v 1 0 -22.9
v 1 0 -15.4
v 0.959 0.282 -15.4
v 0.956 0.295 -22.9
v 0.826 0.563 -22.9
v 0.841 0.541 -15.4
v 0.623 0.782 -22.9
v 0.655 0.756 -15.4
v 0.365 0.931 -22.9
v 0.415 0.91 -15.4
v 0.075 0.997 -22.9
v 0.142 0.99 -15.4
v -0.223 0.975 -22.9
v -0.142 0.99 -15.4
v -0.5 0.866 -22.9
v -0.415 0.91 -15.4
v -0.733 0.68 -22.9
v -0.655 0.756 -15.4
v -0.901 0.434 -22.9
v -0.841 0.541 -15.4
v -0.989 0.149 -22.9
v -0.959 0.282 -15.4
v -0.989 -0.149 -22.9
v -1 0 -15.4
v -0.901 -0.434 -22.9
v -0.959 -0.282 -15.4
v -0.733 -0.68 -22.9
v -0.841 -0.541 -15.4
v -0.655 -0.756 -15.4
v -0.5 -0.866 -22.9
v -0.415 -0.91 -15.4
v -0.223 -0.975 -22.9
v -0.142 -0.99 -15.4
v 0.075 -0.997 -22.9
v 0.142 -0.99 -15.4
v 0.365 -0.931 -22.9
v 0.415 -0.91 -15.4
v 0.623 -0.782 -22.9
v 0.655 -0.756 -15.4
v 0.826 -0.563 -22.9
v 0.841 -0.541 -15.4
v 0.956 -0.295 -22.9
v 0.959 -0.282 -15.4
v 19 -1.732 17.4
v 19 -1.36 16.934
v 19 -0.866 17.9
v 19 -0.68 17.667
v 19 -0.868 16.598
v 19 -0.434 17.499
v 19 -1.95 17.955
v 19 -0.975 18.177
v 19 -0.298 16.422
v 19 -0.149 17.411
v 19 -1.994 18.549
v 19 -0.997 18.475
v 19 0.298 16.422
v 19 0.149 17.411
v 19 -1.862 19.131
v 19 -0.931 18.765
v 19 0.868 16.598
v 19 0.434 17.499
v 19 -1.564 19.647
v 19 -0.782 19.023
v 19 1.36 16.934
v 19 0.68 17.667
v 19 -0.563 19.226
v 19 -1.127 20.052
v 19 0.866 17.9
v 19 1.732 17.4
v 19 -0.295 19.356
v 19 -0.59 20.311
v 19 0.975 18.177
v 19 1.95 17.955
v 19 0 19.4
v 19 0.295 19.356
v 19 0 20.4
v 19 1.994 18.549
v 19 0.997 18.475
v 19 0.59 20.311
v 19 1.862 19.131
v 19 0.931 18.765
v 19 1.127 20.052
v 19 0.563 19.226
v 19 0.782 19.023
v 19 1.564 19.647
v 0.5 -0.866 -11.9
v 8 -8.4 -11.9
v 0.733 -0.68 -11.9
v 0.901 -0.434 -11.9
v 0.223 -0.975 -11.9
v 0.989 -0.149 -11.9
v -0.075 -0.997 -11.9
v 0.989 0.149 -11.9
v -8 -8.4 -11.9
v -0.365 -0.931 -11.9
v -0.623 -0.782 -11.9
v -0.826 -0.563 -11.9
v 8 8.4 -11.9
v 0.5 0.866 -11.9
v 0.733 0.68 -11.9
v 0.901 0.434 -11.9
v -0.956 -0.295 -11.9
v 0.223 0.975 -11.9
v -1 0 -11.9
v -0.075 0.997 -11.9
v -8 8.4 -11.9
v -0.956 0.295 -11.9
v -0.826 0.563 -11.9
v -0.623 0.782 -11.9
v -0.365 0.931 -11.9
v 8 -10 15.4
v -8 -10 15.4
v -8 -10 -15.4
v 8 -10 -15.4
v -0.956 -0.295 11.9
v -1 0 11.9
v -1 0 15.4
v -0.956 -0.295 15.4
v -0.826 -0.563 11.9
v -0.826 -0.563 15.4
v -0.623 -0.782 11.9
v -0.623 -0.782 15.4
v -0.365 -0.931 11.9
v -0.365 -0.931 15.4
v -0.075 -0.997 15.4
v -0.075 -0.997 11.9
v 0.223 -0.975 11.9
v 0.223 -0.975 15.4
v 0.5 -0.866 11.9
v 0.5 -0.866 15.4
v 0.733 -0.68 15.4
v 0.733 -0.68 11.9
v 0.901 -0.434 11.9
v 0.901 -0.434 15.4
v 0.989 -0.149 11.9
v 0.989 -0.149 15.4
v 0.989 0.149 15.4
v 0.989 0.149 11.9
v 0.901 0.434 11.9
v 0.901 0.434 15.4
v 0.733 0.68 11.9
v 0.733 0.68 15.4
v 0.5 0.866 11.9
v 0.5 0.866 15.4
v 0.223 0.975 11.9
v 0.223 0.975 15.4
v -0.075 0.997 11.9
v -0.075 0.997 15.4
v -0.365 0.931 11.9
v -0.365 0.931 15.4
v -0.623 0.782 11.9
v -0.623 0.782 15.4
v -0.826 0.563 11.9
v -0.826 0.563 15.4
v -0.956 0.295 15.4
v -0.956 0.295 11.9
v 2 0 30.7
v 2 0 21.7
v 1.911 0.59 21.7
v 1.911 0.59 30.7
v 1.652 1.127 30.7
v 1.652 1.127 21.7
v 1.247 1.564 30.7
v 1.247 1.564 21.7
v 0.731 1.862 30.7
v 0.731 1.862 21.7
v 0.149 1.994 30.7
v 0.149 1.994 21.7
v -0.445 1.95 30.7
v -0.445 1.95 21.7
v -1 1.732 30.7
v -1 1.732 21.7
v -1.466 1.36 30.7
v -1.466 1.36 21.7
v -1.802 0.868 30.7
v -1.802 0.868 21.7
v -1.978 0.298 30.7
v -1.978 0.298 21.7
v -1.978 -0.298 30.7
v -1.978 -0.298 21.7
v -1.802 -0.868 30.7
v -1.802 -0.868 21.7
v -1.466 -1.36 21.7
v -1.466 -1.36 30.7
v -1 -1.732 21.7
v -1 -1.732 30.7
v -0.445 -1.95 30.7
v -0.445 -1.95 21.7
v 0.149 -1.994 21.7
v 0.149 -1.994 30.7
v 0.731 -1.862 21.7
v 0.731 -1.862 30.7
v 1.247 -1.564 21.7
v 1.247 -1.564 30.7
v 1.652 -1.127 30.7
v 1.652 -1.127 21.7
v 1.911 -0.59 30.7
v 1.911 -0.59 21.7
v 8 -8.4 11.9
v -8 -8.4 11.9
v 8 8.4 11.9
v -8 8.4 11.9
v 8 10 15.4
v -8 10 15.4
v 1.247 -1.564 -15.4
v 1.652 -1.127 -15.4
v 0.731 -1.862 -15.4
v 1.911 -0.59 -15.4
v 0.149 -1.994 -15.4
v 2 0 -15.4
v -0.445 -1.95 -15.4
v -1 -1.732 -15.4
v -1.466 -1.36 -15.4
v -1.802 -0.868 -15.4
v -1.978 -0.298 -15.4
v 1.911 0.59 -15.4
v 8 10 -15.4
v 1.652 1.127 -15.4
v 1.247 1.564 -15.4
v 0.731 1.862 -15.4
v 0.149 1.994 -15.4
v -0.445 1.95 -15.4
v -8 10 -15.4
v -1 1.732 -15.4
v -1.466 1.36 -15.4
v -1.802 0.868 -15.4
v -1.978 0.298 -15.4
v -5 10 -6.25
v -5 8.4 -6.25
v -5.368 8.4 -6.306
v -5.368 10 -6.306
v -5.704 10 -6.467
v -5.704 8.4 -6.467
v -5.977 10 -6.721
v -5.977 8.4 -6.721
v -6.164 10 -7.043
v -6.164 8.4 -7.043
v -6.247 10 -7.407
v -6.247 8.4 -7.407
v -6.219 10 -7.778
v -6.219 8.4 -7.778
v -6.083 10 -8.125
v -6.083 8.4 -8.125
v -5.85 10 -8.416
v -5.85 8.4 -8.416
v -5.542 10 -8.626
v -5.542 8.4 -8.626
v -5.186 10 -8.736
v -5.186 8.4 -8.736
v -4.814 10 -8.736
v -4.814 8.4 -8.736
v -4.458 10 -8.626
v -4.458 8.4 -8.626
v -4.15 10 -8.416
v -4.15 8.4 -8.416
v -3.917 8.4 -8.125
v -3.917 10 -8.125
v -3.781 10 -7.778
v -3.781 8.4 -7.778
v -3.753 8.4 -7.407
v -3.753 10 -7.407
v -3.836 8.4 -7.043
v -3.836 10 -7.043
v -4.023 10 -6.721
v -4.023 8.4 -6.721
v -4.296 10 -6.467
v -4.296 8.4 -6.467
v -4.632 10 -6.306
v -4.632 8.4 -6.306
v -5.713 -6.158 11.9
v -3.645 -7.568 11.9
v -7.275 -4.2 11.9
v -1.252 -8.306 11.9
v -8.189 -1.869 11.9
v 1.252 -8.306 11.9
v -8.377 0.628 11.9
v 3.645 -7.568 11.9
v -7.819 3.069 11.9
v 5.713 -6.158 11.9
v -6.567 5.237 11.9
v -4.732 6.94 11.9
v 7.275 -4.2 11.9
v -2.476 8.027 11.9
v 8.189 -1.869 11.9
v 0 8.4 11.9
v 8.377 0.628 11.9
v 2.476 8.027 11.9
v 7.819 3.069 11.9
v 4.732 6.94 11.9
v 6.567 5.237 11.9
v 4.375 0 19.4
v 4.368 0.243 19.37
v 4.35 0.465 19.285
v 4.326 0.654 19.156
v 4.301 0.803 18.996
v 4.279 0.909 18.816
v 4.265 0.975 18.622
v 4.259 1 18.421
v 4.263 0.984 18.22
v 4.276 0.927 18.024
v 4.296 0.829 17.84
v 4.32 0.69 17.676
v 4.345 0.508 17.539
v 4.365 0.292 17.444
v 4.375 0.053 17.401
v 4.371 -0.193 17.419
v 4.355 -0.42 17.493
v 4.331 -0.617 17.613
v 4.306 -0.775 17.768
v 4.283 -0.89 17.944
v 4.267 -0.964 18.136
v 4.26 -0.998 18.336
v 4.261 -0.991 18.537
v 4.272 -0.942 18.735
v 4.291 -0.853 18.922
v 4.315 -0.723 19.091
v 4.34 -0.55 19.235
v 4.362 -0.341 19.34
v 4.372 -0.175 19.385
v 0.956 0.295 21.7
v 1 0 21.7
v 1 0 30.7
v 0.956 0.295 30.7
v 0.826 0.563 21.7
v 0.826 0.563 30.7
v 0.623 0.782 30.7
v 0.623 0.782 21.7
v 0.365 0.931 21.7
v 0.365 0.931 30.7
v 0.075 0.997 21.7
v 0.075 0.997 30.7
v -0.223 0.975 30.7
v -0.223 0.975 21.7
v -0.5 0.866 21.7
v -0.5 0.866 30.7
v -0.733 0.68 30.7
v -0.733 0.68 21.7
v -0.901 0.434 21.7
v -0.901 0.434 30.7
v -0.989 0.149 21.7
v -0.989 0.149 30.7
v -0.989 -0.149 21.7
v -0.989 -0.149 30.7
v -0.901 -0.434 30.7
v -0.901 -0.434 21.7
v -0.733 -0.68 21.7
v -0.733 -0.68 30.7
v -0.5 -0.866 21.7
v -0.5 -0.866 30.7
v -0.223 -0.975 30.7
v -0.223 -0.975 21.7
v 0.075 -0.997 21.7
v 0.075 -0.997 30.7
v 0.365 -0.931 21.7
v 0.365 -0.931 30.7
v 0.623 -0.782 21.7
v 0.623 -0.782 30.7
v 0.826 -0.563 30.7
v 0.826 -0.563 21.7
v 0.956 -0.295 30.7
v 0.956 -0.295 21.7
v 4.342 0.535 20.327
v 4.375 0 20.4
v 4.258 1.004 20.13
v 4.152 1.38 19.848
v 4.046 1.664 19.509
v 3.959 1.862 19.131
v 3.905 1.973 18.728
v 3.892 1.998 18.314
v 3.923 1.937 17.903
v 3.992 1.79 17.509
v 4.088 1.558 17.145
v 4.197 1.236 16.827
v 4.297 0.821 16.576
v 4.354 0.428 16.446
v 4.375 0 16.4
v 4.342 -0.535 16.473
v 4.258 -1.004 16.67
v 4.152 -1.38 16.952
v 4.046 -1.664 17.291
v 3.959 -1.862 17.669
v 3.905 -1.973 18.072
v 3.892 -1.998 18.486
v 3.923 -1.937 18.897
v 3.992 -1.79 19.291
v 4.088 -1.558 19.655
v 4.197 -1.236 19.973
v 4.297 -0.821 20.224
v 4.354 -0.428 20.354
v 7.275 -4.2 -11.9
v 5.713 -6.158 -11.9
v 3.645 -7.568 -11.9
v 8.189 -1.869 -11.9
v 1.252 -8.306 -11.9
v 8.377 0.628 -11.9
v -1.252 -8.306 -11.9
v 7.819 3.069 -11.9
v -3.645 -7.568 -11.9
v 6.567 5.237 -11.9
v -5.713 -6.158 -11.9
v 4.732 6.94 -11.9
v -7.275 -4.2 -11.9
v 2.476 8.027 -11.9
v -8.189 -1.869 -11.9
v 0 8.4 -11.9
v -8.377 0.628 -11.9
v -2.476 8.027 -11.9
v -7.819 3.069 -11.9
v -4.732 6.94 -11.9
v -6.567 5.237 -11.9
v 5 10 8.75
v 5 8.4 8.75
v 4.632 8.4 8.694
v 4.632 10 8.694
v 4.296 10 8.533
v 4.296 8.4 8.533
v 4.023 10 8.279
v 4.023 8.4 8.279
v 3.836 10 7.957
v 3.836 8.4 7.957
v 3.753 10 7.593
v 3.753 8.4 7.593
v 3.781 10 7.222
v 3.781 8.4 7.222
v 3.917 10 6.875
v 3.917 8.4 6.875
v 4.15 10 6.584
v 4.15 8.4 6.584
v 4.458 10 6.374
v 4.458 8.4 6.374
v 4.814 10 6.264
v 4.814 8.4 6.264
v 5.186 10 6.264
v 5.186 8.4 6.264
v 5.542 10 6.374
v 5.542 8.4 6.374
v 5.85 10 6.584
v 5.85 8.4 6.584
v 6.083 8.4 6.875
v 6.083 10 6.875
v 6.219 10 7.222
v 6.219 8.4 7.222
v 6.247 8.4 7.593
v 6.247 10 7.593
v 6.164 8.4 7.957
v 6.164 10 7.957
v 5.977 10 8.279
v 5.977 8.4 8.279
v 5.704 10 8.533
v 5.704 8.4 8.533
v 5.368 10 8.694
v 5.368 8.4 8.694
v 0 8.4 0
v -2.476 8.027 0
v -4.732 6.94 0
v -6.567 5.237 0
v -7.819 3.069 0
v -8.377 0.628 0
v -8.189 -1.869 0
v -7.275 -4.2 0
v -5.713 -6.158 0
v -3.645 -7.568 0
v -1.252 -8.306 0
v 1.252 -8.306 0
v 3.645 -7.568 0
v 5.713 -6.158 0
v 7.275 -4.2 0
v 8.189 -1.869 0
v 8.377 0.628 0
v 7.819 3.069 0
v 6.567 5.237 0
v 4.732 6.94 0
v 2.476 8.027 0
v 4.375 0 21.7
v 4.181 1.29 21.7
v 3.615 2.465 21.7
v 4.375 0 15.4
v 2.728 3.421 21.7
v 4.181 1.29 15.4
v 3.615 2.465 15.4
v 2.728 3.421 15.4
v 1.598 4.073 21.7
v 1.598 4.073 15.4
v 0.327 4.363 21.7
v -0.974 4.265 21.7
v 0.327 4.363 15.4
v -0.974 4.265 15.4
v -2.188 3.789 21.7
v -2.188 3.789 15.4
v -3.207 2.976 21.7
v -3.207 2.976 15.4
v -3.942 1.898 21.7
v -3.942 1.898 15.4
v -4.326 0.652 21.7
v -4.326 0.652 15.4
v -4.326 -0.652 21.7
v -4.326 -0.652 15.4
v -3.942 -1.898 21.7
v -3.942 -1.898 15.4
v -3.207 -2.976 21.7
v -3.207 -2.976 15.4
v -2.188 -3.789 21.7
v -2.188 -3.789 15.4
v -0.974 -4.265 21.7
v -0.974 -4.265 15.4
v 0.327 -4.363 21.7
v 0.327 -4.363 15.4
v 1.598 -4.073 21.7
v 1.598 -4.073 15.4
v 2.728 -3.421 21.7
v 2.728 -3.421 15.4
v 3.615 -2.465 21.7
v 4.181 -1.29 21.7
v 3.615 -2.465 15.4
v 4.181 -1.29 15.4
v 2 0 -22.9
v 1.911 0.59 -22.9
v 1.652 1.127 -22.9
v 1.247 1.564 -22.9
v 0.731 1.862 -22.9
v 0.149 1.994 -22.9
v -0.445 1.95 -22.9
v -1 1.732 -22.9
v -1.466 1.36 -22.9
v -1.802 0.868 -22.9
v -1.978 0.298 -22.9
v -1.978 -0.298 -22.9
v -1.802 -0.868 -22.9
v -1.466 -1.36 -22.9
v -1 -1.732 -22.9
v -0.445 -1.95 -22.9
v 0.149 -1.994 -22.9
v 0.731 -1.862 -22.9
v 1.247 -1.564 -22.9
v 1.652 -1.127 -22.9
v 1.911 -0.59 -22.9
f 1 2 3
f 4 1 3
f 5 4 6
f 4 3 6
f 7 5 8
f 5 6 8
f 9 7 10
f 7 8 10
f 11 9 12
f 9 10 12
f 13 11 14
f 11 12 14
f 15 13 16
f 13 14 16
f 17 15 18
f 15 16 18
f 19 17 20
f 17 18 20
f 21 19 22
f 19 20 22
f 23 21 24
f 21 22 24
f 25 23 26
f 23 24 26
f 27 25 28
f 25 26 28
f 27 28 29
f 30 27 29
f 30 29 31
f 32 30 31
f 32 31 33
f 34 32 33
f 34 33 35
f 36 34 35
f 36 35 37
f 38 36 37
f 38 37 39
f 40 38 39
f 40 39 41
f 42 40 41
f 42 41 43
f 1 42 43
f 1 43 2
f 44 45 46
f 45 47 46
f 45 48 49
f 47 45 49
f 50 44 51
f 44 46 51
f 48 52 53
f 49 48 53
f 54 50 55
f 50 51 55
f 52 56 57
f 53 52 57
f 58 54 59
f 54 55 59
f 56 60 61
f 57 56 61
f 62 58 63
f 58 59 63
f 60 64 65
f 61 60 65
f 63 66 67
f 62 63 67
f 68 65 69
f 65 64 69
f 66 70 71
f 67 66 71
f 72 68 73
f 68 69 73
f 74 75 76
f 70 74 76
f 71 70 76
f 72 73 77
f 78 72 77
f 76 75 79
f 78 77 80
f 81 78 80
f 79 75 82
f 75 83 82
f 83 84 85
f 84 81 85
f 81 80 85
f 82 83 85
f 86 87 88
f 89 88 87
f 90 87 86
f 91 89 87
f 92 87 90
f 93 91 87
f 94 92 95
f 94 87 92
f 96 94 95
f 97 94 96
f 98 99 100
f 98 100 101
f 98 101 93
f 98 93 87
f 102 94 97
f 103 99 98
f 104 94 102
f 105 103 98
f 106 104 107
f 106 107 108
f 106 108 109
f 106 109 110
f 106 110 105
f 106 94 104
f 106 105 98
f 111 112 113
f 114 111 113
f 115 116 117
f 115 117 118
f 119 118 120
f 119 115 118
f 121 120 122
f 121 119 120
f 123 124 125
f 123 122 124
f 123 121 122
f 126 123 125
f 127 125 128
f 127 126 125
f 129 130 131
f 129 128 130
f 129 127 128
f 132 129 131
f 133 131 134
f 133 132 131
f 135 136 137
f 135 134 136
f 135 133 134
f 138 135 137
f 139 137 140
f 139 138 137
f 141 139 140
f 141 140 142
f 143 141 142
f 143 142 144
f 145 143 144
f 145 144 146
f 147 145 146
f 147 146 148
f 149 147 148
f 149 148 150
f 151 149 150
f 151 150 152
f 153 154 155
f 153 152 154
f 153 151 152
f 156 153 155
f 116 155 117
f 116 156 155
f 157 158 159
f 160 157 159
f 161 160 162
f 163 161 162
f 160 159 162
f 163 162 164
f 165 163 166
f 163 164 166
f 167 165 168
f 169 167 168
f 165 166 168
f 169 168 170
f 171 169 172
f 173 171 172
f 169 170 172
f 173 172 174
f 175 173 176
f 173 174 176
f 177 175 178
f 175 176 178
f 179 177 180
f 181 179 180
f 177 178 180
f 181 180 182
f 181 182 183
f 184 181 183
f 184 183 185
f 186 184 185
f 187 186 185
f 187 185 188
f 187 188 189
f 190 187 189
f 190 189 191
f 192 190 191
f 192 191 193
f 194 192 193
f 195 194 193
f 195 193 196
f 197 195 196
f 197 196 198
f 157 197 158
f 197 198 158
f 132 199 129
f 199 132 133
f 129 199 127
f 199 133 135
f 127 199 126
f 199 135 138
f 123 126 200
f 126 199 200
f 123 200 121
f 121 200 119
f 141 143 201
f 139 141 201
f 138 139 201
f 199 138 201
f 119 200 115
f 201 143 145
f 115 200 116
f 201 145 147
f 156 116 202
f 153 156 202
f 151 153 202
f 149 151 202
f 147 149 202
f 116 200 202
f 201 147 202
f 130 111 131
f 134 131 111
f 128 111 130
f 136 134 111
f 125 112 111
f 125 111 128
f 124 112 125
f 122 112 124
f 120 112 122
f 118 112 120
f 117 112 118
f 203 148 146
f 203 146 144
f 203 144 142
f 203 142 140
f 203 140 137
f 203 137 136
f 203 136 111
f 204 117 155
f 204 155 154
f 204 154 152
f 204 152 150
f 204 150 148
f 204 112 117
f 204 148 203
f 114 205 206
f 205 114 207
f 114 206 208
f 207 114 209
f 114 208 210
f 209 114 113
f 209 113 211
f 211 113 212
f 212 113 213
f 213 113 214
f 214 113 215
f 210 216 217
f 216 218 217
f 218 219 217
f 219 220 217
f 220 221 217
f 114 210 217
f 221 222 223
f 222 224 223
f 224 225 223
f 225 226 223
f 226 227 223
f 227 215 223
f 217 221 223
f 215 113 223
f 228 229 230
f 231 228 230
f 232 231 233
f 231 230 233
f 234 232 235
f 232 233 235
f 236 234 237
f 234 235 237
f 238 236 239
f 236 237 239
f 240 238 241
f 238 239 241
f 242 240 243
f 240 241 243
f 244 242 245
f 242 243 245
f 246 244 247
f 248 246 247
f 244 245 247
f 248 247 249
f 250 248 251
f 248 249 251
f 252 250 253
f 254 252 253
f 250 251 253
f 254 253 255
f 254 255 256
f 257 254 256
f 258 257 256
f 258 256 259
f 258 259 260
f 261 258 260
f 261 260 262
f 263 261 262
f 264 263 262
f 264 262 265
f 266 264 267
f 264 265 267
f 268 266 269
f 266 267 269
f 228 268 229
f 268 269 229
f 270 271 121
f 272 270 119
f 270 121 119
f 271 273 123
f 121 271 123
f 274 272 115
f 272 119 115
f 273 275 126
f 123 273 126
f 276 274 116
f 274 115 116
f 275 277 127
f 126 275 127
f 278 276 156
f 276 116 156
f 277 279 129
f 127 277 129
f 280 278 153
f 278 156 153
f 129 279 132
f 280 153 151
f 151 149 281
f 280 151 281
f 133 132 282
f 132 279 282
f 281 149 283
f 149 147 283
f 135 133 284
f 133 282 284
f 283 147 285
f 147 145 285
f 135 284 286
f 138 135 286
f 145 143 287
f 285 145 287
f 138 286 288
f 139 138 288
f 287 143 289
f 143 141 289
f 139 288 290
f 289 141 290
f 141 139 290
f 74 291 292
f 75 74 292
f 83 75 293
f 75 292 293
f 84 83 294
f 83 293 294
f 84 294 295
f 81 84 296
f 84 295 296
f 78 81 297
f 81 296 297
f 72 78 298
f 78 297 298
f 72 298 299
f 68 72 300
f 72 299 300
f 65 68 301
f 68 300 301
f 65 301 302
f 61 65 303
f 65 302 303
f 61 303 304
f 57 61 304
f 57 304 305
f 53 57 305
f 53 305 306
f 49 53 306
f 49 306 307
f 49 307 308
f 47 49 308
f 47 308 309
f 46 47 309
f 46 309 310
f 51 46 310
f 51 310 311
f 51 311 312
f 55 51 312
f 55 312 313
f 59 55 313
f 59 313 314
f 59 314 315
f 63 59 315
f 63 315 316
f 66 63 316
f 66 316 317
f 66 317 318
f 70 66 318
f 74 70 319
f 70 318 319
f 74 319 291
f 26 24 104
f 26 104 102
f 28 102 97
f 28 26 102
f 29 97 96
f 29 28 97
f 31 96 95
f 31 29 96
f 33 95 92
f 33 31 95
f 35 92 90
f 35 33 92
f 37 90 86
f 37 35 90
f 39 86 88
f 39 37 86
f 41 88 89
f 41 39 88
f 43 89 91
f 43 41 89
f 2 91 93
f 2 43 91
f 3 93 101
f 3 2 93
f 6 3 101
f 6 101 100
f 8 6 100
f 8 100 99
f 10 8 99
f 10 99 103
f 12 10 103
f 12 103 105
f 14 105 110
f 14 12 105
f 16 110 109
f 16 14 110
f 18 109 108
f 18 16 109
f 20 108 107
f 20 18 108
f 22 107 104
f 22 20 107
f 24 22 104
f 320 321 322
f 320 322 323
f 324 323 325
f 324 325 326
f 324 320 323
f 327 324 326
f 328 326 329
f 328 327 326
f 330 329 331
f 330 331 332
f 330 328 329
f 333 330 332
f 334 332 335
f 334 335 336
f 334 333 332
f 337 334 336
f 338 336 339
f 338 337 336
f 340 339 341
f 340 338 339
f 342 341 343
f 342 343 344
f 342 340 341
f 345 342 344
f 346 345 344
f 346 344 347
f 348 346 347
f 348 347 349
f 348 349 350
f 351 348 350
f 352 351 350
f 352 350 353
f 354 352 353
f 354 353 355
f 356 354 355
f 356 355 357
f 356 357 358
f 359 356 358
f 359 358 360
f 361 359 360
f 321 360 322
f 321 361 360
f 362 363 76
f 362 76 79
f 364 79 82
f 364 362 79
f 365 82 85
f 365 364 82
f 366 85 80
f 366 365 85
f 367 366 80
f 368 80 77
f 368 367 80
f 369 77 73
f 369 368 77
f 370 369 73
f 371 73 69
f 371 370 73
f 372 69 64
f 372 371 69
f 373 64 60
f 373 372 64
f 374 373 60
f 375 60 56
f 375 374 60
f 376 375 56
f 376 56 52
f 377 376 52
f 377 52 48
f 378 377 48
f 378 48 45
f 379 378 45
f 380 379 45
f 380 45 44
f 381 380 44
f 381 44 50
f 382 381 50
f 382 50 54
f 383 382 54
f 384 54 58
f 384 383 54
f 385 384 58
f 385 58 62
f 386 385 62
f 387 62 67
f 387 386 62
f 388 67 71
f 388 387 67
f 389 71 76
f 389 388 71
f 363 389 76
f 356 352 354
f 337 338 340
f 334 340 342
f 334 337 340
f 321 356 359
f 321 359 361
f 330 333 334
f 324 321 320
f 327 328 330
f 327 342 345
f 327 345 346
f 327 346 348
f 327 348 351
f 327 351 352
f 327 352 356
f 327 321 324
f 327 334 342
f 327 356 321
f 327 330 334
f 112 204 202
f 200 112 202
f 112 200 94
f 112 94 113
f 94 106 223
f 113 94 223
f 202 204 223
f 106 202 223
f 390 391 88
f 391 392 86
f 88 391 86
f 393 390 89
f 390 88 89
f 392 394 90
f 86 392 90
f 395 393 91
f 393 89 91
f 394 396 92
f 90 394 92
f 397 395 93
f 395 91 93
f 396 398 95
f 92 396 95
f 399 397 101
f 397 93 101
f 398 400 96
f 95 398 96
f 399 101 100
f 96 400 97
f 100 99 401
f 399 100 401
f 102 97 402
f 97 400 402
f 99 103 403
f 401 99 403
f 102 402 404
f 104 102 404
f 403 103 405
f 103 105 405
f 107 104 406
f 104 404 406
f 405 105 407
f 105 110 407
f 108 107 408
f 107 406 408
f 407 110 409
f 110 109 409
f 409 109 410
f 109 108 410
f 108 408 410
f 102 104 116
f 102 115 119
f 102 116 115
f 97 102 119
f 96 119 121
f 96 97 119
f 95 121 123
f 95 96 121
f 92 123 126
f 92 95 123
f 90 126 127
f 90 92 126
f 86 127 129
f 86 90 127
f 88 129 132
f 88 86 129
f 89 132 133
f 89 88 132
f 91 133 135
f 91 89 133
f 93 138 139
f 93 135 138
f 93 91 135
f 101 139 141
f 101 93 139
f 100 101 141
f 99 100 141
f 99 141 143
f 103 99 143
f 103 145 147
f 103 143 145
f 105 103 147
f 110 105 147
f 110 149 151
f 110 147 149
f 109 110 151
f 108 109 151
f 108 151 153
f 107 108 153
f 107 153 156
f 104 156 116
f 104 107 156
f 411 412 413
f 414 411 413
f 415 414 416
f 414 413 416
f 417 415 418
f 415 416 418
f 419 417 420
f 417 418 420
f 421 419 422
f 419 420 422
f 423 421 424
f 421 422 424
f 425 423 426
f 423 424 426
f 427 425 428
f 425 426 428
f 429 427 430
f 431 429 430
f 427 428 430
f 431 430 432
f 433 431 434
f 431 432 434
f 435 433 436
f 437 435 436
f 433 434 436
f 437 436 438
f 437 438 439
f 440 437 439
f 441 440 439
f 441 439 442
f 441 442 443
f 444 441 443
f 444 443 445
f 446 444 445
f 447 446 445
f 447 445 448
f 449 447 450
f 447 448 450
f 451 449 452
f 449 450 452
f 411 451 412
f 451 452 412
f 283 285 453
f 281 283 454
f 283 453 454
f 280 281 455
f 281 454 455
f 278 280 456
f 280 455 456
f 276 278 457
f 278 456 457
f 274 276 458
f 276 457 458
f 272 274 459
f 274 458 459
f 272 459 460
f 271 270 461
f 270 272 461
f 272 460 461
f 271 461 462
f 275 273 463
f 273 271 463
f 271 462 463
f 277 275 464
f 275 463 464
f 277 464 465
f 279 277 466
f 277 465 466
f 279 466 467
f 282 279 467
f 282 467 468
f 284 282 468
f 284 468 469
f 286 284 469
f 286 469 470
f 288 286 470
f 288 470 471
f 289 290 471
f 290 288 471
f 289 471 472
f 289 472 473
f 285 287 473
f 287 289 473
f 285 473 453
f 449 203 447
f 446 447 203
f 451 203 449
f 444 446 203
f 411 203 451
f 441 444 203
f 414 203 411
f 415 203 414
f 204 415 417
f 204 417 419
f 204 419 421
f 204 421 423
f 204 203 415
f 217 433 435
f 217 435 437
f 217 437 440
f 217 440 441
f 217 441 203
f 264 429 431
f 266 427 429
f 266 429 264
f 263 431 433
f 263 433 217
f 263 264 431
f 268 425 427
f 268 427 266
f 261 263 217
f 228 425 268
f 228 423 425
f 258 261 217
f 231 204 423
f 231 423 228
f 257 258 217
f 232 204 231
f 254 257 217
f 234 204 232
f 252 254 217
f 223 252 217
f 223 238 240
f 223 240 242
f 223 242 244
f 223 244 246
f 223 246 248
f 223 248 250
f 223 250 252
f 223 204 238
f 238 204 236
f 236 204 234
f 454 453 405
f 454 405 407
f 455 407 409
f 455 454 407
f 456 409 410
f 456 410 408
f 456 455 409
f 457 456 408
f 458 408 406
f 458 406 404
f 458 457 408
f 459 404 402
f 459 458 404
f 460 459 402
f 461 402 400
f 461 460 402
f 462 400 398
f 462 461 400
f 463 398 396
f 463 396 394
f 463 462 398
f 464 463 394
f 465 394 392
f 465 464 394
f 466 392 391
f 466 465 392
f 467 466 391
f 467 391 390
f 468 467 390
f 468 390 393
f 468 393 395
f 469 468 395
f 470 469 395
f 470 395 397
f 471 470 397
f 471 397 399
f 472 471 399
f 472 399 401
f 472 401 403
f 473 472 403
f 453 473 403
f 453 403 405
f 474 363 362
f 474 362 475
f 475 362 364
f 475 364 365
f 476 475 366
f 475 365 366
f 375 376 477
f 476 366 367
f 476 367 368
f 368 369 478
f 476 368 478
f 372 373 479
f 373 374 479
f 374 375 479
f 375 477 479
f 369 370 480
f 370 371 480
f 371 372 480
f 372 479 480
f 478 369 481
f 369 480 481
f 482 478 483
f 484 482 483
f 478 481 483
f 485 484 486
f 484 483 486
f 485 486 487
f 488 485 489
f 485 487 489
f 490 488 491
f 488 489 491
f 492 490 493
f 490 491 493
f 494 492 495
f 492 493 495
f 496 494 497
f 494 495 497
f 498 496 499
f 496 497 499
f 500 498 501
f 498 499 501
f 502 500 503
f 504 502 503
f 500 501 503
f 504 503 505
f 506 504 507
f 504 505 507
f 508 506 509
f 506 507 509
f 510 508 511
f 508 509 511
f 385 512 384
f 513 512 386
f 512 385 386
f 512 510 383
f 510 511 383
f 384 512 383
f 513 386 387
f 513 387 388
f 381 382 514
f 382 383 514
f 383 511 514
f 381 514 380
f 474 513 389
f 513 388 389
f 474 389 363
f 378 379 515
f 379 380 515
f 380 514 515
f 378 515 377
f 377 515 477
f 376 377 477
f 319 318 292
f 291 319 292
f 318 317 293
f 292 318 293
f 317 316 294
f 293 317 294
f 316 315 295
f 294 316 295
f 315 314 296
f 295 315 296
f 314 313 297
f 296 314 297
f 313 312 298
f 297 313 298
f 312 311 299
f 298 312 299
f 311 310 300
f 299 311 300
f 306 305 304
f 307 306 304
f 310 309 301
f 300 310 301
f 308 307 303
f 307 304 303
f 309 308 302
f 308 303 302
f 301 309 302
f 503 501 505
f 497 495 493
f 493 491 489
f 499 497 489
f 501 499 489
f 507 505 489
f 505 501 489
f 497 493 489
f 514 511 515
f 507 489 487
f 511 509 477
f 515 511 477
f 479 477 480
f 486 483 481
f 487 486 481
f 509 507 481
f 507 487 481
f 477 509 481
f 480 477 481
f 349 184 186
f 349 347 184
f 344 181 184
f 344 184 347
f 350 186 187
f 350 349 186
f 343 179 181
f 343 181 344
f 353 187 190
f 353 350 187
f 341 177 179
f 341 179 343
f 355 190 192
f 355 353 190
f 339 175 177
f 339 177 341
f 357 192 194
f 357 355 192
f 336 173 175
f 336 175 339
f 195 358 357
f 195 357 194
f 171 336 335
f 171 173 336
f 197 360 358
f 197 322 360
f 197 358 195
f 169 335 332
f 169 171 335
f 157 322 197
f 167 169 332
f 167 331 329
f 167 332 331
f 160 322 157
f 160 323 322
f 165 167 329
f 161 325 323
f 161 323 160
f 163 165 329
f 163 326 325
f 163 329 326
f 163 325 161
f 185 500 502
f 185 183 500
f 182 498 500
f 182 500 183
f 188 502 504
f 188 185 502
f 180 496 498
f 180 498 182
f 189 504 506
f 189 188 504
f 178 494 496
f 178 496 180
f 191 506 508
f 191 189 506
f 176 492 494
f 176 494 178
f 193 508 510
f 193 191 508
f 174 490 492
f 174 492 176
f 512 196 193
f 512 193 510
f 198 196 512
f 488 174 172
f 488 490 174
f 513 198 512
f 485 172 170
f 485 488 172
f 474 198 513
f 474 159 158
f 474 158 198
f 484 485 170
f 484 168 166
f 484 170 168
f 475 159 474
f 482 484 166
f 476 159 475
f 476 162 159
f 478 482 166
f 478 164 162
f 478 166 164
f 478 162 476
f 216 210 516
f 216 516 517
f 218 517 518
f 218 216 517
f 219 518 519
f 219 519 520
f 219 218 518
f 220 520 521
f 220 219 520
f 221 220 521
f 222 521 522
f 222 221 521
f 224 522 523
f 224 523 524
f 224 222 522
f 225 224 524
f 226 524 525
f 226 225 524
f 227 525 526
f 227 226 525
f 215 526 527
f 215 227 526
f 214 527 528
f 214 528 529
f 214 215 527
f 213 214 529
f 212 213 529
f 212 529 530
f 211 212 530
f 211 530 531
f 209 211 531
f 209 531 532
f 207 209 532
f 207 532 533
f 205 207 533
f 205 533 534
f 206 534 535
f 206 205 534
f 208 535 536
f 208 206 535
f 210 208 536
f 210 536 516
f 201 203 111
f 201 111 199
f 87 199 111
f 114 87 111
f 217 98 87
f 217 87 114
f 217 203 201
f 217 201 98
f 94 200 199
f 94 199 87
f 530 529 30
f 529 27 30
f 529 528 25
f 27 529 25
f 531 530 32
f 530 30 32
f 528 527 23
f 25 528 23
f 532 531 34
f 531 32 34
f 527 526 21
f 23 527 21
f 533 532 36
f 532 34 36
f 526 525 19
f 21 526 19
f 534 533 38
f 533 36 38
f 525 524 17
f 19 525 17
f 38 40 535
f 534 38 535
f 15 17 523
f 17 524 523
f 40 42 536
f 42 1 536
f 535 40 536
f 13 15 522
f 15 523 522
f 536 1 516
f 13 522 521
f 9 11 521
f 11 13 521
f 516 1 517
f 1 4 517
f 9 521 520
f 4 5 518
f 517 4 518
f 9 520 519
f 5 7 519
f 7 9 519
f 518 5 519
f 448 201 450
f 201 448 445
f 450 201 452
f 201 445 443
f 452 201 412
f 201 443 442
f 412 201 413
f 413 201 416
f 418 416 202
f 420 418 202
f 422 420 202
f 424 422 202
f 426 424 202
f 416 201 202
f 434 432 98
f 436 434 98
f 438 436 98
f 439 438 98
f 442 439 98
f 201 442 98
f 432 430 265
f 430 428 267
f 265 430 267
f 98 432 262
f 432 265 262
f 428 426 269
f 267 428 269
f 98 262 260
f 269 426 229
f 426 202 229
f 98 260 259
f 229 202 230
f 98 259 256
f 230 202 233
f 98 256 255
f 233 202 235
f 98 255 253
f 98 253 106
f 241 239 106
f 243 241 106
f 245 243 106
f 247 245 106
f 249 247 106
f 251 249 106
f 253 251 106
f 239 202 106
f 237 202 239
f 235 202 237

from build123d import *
from build123d.topology import SkipClean

# Parameters (mm, degrees)
FRAME_EXTRUDE_DEPTH                     = 8
FRAME_EXTRUDE_DEPTH_BACK                = 8
FRAME_SKETCH_W                          = 30.8
FRAME_SKETCH_H                          = 20
FRAME_SKETCH_W_2                        = 23.8
FRAME_SKETCH_H_2                        = 16.8
ELECTROMAGNET_EXTRUDE_REACH             = 22.029
ELECTROMAGNET_SKETCH_R                  = 8.4
ELECTROMAGNET_EXTRUDE_DIRECTION_2_REACH = 22.029
PORT_3_SKETCH_R                         = 2
PORT_3_SKETCH_R_2                       = 1
PORT_3_EXTRUDE_DEPTH                    = 7.5
PORT_3_SKETCH_3_R                       = 1
CENTER_HOLE_CUT_DEPTH                   = 34.45444664
BASE_OF_PORTS_1_2_SKETCH_R              = 4.375
BASE_OF_PORT_1_2_PORTS_DEPTH            = 6.3
PORT_2_SKETCH_R                         = 2
PORT_2_SKETCH_R_2                       = 1
PORT_2_EXTRUDE_DEPTH                    = 9
PORTS_1_SKETCH_R                        = 2
PORTS_1_SKETCH_R_2                      = 1
PORTS_1_EXTRUDE_DEPTH                   = 19
MOUNTING_HOLES_PROFILE_SKETCH_W         = 1.25
MOUNTING_HOLES_PROFILE_SKETCH_H         = 3.250185188
MOUNTING_HOLES_AT_2_COUNT               = 2
MOUNTING_HOLES_AT_2_PITCH               = 18.027756377


with BuildPart() as part:
    # Frame Sketch → Frame Extrude (new, two sides: drawn at the far end of the back side and taken through both)
    with BuildSketch(Plane(origin=(0, 0, 0), x_dir=(0, 0, -1), z_dir=(1, 0, 0)).offset(-FRAME_EXTRUDE_DEPTH_BACK)):
        Rectangle(FRAME_SKETCH_W, FRAME_SKETCH_H)
        Rectangle(FRAME_SKETCH_W_2, FRAME_SKETCH_H_2, mode=Mode.SUBTRACT)
    extrude(amount=FRAME_EXTRUDE_DEPTH + FRAME_EXTRUDE_DEPTH_BACK)


with BuildPart() as body_2:

    # Electromagnet Extrude: up to this face of the body (flat: up to its plane)
    electromagnet_extrude_end = Plane(part.part.faces().sort_by_distance((0, 0, 11.9))[0])
    # Electromagnet Sketch → Electromagnet Extrude (new, up to the picked face)
    with BuildSketch(Plane.XY, mode=Mode.PRIVATE) as electromagnet_extrude_sk1:
        with Locations(Location((0, 0, 0), (0, 0, 90))):
            Circle(ELECTROMAGNET_SKETCH_R)
    electromagnet_extrude_tool1 = split(extrude(electromagnet_extrude_sk1.sketch, amount=ELECTROMAGNET_EXTRUDE_REACH, mode=Mode.PRIVATE), bisect_by=electromagnet_extrude_end, keep=Keep.BOTH, mode=Mode.PRIVATE)
    add(electromagnet_extrude_tool1.solids().sort_by(Axis((0, 0, 0), (0, 0, 1)))[0])


    # Electromagnet Extrude direction 2: up to this face of the body (flat: up to its plane)
    electromagnet_extrude_direction_2_end = Plane(part.part.faces().sort_by_distance((0, 0, -11.9))[0])
    # Electromagnet Sketch → Electromagnet Extrude direction 2 (add, up to the picked face)
    with BuildSketch(Plane.XY, mode=Mode.PRIVATE) as electromagnet_extrude_direction_2_sk1:
        with Locations(Location((0, 0, 0), (0, 0, 90))):
            Circle(ELECTROMAGNET_SKETCH_R)
    electromagnet_extrude_direction_2_tool1 = split(extrude(electromagnet_extrude_direction_2_sk1.sketch, amount=-ELECTROMAGNET_EXTRUDE_DIRECTION_2_REACH, mode=Mode.PRIVATE), bisect_by=electromagnet_extrude_direction_2_end, keep=Keep.BOTH, mode=Mode.PRIVATE)
    add(electromagnet_extrude_direction_2_tool1.solids().sort_by(Axis((0, 0, 0), (0, 0, -1)))[0])


with BuildPart() as part_1:
    add(part.part)

    # Port 3 Sketch → Port 3 Extrude (add)
    with BuildSketch(Plane.XY.offset(-15.4)):
        Circle(PORT_3_SKETCH_R)
        Circle(PORT_3_SKETCH_R_2, mode=Mode.SUBTRACT)
    extrude(amount=-PORT_3_EXTRUDE_DEPTH)


with BuildPart() as center_hole_cut_tool:
    # Port 3 Sketch<3> → Center Hole Cut (new, through all)
    with SkipClean():  # the faces are left unmerged after this step: merging them gives an invalid solid
        with BuildSketch(Plane.XY.offset(-15.4)):
            with Locations(Location((0, 0, 0), (0, 0, 180))):
                Circle(PORT_3_SKETCH_3_R)
        extrude(amount=CENTER_HOLE_CUT_DEPTH)


with BuildPart() as part_2:
    with SkipClean():  # the faces are left unmerged after this step: merging them gives an invalid solid
        add(part_1.part)

        # Center Hole Cut: cut by center_hole_cut_tool
        add(center_hole_cut_tool.part, mode=Mode.SUBTRACT)

    # Mounting Holes Profile Sketch → Mounting Holes (revolve, cut)
    with SkipClean():  # the faces are left unmerged after this step: merging them gives an invalid solid
        with BuildSketch(Plane(origin=(5, 10, 7.5), x_dir=(0, 0, 1), z_dir=(1, 0, 0))):
            with Locations((0.625, 1.625092594)):
                Rectangle(MOUNTING_HOLES_PROFILE_SKETCH_W, MOUNTING_HOLES_PROFILE_SKETCH_H)
        mounting_holes = revolve(axis=Axis((5, 16.35, 7.5), (0, -1, 0)), mode=Mode.SUBTRACT)

    # Mounting Holes at 2: Mounting Holes ×2
    with SkipClean():  # the faces are left unmerged after this step: merging them gives an invalid solid
        with Locations(*[Vector(-0.5547001962252294, 0, -0.8320502943378435) * (i * MOUNTING_HOLES_AT_2_PITCH) for i in range(1, MOUNTING_HOLES_AT_2_COUNT)]):
            add(mounting_holes, mode=Mode.SUBTRACT)


with BuildPart() as body_2_1:
    with SkipClean():  # the faces are left unmerged after this step: merging them gives an invalid solid
        add(body_2.part)

        # Center Hole Cut: cut by center_hole_cut_tool
        add(center_hole_cut_tool.part, mode=Mode.SUBTRACT)


with BuildPart() as body_3:
    # Base of Ports 1&2 Sketch → Base of Port 1&2 Ports (new body)
    with BuildSketch(Plane.XY.offset(15.4)):
        Circle(BASE_OF_PORTS_1_2_SKETCH_R)
    extrude(amount=BASE_OF_PORT_1_2_PORTS_DEPTH)

    # Port 2 Sketch → Port 2 Extrude (add)
    with BuildSketch(Plane.XY.offset(21.7)):
        Circle(PORT_2_SKETCH_R)
        Circle(PORT_2_SKETCH_R_2, mode=Mode.SUBTRACT)
    extrude(amount=PORT_2_EXTRUDE_DEPTH)

    # Ports 1 Sketch → Ports 1 Extrude (add)
    with BuildSketch(Plane(origin=(0, 2.609545443, 0), x_dir=(0, 0, -1), z_dir=(-1, 0, 0))):
        with Locations(Location((-18.4, 2.609545443, 0), (0, 0, 180))):
            Circle(PORTS_1_SKETCH_R)
        with Locations(Location((-18.4, 2.609545443, 0), (0, 0, 180))):
            Circle(PORTS_1_SKETCH_R_2, mode=Mode.SUBTRACT)
    extrude(amount=-PORTS_1_EXTRUDE_DEPTH)


solid = Compound([part_2.part, body_2_1.part, body_3.part])
